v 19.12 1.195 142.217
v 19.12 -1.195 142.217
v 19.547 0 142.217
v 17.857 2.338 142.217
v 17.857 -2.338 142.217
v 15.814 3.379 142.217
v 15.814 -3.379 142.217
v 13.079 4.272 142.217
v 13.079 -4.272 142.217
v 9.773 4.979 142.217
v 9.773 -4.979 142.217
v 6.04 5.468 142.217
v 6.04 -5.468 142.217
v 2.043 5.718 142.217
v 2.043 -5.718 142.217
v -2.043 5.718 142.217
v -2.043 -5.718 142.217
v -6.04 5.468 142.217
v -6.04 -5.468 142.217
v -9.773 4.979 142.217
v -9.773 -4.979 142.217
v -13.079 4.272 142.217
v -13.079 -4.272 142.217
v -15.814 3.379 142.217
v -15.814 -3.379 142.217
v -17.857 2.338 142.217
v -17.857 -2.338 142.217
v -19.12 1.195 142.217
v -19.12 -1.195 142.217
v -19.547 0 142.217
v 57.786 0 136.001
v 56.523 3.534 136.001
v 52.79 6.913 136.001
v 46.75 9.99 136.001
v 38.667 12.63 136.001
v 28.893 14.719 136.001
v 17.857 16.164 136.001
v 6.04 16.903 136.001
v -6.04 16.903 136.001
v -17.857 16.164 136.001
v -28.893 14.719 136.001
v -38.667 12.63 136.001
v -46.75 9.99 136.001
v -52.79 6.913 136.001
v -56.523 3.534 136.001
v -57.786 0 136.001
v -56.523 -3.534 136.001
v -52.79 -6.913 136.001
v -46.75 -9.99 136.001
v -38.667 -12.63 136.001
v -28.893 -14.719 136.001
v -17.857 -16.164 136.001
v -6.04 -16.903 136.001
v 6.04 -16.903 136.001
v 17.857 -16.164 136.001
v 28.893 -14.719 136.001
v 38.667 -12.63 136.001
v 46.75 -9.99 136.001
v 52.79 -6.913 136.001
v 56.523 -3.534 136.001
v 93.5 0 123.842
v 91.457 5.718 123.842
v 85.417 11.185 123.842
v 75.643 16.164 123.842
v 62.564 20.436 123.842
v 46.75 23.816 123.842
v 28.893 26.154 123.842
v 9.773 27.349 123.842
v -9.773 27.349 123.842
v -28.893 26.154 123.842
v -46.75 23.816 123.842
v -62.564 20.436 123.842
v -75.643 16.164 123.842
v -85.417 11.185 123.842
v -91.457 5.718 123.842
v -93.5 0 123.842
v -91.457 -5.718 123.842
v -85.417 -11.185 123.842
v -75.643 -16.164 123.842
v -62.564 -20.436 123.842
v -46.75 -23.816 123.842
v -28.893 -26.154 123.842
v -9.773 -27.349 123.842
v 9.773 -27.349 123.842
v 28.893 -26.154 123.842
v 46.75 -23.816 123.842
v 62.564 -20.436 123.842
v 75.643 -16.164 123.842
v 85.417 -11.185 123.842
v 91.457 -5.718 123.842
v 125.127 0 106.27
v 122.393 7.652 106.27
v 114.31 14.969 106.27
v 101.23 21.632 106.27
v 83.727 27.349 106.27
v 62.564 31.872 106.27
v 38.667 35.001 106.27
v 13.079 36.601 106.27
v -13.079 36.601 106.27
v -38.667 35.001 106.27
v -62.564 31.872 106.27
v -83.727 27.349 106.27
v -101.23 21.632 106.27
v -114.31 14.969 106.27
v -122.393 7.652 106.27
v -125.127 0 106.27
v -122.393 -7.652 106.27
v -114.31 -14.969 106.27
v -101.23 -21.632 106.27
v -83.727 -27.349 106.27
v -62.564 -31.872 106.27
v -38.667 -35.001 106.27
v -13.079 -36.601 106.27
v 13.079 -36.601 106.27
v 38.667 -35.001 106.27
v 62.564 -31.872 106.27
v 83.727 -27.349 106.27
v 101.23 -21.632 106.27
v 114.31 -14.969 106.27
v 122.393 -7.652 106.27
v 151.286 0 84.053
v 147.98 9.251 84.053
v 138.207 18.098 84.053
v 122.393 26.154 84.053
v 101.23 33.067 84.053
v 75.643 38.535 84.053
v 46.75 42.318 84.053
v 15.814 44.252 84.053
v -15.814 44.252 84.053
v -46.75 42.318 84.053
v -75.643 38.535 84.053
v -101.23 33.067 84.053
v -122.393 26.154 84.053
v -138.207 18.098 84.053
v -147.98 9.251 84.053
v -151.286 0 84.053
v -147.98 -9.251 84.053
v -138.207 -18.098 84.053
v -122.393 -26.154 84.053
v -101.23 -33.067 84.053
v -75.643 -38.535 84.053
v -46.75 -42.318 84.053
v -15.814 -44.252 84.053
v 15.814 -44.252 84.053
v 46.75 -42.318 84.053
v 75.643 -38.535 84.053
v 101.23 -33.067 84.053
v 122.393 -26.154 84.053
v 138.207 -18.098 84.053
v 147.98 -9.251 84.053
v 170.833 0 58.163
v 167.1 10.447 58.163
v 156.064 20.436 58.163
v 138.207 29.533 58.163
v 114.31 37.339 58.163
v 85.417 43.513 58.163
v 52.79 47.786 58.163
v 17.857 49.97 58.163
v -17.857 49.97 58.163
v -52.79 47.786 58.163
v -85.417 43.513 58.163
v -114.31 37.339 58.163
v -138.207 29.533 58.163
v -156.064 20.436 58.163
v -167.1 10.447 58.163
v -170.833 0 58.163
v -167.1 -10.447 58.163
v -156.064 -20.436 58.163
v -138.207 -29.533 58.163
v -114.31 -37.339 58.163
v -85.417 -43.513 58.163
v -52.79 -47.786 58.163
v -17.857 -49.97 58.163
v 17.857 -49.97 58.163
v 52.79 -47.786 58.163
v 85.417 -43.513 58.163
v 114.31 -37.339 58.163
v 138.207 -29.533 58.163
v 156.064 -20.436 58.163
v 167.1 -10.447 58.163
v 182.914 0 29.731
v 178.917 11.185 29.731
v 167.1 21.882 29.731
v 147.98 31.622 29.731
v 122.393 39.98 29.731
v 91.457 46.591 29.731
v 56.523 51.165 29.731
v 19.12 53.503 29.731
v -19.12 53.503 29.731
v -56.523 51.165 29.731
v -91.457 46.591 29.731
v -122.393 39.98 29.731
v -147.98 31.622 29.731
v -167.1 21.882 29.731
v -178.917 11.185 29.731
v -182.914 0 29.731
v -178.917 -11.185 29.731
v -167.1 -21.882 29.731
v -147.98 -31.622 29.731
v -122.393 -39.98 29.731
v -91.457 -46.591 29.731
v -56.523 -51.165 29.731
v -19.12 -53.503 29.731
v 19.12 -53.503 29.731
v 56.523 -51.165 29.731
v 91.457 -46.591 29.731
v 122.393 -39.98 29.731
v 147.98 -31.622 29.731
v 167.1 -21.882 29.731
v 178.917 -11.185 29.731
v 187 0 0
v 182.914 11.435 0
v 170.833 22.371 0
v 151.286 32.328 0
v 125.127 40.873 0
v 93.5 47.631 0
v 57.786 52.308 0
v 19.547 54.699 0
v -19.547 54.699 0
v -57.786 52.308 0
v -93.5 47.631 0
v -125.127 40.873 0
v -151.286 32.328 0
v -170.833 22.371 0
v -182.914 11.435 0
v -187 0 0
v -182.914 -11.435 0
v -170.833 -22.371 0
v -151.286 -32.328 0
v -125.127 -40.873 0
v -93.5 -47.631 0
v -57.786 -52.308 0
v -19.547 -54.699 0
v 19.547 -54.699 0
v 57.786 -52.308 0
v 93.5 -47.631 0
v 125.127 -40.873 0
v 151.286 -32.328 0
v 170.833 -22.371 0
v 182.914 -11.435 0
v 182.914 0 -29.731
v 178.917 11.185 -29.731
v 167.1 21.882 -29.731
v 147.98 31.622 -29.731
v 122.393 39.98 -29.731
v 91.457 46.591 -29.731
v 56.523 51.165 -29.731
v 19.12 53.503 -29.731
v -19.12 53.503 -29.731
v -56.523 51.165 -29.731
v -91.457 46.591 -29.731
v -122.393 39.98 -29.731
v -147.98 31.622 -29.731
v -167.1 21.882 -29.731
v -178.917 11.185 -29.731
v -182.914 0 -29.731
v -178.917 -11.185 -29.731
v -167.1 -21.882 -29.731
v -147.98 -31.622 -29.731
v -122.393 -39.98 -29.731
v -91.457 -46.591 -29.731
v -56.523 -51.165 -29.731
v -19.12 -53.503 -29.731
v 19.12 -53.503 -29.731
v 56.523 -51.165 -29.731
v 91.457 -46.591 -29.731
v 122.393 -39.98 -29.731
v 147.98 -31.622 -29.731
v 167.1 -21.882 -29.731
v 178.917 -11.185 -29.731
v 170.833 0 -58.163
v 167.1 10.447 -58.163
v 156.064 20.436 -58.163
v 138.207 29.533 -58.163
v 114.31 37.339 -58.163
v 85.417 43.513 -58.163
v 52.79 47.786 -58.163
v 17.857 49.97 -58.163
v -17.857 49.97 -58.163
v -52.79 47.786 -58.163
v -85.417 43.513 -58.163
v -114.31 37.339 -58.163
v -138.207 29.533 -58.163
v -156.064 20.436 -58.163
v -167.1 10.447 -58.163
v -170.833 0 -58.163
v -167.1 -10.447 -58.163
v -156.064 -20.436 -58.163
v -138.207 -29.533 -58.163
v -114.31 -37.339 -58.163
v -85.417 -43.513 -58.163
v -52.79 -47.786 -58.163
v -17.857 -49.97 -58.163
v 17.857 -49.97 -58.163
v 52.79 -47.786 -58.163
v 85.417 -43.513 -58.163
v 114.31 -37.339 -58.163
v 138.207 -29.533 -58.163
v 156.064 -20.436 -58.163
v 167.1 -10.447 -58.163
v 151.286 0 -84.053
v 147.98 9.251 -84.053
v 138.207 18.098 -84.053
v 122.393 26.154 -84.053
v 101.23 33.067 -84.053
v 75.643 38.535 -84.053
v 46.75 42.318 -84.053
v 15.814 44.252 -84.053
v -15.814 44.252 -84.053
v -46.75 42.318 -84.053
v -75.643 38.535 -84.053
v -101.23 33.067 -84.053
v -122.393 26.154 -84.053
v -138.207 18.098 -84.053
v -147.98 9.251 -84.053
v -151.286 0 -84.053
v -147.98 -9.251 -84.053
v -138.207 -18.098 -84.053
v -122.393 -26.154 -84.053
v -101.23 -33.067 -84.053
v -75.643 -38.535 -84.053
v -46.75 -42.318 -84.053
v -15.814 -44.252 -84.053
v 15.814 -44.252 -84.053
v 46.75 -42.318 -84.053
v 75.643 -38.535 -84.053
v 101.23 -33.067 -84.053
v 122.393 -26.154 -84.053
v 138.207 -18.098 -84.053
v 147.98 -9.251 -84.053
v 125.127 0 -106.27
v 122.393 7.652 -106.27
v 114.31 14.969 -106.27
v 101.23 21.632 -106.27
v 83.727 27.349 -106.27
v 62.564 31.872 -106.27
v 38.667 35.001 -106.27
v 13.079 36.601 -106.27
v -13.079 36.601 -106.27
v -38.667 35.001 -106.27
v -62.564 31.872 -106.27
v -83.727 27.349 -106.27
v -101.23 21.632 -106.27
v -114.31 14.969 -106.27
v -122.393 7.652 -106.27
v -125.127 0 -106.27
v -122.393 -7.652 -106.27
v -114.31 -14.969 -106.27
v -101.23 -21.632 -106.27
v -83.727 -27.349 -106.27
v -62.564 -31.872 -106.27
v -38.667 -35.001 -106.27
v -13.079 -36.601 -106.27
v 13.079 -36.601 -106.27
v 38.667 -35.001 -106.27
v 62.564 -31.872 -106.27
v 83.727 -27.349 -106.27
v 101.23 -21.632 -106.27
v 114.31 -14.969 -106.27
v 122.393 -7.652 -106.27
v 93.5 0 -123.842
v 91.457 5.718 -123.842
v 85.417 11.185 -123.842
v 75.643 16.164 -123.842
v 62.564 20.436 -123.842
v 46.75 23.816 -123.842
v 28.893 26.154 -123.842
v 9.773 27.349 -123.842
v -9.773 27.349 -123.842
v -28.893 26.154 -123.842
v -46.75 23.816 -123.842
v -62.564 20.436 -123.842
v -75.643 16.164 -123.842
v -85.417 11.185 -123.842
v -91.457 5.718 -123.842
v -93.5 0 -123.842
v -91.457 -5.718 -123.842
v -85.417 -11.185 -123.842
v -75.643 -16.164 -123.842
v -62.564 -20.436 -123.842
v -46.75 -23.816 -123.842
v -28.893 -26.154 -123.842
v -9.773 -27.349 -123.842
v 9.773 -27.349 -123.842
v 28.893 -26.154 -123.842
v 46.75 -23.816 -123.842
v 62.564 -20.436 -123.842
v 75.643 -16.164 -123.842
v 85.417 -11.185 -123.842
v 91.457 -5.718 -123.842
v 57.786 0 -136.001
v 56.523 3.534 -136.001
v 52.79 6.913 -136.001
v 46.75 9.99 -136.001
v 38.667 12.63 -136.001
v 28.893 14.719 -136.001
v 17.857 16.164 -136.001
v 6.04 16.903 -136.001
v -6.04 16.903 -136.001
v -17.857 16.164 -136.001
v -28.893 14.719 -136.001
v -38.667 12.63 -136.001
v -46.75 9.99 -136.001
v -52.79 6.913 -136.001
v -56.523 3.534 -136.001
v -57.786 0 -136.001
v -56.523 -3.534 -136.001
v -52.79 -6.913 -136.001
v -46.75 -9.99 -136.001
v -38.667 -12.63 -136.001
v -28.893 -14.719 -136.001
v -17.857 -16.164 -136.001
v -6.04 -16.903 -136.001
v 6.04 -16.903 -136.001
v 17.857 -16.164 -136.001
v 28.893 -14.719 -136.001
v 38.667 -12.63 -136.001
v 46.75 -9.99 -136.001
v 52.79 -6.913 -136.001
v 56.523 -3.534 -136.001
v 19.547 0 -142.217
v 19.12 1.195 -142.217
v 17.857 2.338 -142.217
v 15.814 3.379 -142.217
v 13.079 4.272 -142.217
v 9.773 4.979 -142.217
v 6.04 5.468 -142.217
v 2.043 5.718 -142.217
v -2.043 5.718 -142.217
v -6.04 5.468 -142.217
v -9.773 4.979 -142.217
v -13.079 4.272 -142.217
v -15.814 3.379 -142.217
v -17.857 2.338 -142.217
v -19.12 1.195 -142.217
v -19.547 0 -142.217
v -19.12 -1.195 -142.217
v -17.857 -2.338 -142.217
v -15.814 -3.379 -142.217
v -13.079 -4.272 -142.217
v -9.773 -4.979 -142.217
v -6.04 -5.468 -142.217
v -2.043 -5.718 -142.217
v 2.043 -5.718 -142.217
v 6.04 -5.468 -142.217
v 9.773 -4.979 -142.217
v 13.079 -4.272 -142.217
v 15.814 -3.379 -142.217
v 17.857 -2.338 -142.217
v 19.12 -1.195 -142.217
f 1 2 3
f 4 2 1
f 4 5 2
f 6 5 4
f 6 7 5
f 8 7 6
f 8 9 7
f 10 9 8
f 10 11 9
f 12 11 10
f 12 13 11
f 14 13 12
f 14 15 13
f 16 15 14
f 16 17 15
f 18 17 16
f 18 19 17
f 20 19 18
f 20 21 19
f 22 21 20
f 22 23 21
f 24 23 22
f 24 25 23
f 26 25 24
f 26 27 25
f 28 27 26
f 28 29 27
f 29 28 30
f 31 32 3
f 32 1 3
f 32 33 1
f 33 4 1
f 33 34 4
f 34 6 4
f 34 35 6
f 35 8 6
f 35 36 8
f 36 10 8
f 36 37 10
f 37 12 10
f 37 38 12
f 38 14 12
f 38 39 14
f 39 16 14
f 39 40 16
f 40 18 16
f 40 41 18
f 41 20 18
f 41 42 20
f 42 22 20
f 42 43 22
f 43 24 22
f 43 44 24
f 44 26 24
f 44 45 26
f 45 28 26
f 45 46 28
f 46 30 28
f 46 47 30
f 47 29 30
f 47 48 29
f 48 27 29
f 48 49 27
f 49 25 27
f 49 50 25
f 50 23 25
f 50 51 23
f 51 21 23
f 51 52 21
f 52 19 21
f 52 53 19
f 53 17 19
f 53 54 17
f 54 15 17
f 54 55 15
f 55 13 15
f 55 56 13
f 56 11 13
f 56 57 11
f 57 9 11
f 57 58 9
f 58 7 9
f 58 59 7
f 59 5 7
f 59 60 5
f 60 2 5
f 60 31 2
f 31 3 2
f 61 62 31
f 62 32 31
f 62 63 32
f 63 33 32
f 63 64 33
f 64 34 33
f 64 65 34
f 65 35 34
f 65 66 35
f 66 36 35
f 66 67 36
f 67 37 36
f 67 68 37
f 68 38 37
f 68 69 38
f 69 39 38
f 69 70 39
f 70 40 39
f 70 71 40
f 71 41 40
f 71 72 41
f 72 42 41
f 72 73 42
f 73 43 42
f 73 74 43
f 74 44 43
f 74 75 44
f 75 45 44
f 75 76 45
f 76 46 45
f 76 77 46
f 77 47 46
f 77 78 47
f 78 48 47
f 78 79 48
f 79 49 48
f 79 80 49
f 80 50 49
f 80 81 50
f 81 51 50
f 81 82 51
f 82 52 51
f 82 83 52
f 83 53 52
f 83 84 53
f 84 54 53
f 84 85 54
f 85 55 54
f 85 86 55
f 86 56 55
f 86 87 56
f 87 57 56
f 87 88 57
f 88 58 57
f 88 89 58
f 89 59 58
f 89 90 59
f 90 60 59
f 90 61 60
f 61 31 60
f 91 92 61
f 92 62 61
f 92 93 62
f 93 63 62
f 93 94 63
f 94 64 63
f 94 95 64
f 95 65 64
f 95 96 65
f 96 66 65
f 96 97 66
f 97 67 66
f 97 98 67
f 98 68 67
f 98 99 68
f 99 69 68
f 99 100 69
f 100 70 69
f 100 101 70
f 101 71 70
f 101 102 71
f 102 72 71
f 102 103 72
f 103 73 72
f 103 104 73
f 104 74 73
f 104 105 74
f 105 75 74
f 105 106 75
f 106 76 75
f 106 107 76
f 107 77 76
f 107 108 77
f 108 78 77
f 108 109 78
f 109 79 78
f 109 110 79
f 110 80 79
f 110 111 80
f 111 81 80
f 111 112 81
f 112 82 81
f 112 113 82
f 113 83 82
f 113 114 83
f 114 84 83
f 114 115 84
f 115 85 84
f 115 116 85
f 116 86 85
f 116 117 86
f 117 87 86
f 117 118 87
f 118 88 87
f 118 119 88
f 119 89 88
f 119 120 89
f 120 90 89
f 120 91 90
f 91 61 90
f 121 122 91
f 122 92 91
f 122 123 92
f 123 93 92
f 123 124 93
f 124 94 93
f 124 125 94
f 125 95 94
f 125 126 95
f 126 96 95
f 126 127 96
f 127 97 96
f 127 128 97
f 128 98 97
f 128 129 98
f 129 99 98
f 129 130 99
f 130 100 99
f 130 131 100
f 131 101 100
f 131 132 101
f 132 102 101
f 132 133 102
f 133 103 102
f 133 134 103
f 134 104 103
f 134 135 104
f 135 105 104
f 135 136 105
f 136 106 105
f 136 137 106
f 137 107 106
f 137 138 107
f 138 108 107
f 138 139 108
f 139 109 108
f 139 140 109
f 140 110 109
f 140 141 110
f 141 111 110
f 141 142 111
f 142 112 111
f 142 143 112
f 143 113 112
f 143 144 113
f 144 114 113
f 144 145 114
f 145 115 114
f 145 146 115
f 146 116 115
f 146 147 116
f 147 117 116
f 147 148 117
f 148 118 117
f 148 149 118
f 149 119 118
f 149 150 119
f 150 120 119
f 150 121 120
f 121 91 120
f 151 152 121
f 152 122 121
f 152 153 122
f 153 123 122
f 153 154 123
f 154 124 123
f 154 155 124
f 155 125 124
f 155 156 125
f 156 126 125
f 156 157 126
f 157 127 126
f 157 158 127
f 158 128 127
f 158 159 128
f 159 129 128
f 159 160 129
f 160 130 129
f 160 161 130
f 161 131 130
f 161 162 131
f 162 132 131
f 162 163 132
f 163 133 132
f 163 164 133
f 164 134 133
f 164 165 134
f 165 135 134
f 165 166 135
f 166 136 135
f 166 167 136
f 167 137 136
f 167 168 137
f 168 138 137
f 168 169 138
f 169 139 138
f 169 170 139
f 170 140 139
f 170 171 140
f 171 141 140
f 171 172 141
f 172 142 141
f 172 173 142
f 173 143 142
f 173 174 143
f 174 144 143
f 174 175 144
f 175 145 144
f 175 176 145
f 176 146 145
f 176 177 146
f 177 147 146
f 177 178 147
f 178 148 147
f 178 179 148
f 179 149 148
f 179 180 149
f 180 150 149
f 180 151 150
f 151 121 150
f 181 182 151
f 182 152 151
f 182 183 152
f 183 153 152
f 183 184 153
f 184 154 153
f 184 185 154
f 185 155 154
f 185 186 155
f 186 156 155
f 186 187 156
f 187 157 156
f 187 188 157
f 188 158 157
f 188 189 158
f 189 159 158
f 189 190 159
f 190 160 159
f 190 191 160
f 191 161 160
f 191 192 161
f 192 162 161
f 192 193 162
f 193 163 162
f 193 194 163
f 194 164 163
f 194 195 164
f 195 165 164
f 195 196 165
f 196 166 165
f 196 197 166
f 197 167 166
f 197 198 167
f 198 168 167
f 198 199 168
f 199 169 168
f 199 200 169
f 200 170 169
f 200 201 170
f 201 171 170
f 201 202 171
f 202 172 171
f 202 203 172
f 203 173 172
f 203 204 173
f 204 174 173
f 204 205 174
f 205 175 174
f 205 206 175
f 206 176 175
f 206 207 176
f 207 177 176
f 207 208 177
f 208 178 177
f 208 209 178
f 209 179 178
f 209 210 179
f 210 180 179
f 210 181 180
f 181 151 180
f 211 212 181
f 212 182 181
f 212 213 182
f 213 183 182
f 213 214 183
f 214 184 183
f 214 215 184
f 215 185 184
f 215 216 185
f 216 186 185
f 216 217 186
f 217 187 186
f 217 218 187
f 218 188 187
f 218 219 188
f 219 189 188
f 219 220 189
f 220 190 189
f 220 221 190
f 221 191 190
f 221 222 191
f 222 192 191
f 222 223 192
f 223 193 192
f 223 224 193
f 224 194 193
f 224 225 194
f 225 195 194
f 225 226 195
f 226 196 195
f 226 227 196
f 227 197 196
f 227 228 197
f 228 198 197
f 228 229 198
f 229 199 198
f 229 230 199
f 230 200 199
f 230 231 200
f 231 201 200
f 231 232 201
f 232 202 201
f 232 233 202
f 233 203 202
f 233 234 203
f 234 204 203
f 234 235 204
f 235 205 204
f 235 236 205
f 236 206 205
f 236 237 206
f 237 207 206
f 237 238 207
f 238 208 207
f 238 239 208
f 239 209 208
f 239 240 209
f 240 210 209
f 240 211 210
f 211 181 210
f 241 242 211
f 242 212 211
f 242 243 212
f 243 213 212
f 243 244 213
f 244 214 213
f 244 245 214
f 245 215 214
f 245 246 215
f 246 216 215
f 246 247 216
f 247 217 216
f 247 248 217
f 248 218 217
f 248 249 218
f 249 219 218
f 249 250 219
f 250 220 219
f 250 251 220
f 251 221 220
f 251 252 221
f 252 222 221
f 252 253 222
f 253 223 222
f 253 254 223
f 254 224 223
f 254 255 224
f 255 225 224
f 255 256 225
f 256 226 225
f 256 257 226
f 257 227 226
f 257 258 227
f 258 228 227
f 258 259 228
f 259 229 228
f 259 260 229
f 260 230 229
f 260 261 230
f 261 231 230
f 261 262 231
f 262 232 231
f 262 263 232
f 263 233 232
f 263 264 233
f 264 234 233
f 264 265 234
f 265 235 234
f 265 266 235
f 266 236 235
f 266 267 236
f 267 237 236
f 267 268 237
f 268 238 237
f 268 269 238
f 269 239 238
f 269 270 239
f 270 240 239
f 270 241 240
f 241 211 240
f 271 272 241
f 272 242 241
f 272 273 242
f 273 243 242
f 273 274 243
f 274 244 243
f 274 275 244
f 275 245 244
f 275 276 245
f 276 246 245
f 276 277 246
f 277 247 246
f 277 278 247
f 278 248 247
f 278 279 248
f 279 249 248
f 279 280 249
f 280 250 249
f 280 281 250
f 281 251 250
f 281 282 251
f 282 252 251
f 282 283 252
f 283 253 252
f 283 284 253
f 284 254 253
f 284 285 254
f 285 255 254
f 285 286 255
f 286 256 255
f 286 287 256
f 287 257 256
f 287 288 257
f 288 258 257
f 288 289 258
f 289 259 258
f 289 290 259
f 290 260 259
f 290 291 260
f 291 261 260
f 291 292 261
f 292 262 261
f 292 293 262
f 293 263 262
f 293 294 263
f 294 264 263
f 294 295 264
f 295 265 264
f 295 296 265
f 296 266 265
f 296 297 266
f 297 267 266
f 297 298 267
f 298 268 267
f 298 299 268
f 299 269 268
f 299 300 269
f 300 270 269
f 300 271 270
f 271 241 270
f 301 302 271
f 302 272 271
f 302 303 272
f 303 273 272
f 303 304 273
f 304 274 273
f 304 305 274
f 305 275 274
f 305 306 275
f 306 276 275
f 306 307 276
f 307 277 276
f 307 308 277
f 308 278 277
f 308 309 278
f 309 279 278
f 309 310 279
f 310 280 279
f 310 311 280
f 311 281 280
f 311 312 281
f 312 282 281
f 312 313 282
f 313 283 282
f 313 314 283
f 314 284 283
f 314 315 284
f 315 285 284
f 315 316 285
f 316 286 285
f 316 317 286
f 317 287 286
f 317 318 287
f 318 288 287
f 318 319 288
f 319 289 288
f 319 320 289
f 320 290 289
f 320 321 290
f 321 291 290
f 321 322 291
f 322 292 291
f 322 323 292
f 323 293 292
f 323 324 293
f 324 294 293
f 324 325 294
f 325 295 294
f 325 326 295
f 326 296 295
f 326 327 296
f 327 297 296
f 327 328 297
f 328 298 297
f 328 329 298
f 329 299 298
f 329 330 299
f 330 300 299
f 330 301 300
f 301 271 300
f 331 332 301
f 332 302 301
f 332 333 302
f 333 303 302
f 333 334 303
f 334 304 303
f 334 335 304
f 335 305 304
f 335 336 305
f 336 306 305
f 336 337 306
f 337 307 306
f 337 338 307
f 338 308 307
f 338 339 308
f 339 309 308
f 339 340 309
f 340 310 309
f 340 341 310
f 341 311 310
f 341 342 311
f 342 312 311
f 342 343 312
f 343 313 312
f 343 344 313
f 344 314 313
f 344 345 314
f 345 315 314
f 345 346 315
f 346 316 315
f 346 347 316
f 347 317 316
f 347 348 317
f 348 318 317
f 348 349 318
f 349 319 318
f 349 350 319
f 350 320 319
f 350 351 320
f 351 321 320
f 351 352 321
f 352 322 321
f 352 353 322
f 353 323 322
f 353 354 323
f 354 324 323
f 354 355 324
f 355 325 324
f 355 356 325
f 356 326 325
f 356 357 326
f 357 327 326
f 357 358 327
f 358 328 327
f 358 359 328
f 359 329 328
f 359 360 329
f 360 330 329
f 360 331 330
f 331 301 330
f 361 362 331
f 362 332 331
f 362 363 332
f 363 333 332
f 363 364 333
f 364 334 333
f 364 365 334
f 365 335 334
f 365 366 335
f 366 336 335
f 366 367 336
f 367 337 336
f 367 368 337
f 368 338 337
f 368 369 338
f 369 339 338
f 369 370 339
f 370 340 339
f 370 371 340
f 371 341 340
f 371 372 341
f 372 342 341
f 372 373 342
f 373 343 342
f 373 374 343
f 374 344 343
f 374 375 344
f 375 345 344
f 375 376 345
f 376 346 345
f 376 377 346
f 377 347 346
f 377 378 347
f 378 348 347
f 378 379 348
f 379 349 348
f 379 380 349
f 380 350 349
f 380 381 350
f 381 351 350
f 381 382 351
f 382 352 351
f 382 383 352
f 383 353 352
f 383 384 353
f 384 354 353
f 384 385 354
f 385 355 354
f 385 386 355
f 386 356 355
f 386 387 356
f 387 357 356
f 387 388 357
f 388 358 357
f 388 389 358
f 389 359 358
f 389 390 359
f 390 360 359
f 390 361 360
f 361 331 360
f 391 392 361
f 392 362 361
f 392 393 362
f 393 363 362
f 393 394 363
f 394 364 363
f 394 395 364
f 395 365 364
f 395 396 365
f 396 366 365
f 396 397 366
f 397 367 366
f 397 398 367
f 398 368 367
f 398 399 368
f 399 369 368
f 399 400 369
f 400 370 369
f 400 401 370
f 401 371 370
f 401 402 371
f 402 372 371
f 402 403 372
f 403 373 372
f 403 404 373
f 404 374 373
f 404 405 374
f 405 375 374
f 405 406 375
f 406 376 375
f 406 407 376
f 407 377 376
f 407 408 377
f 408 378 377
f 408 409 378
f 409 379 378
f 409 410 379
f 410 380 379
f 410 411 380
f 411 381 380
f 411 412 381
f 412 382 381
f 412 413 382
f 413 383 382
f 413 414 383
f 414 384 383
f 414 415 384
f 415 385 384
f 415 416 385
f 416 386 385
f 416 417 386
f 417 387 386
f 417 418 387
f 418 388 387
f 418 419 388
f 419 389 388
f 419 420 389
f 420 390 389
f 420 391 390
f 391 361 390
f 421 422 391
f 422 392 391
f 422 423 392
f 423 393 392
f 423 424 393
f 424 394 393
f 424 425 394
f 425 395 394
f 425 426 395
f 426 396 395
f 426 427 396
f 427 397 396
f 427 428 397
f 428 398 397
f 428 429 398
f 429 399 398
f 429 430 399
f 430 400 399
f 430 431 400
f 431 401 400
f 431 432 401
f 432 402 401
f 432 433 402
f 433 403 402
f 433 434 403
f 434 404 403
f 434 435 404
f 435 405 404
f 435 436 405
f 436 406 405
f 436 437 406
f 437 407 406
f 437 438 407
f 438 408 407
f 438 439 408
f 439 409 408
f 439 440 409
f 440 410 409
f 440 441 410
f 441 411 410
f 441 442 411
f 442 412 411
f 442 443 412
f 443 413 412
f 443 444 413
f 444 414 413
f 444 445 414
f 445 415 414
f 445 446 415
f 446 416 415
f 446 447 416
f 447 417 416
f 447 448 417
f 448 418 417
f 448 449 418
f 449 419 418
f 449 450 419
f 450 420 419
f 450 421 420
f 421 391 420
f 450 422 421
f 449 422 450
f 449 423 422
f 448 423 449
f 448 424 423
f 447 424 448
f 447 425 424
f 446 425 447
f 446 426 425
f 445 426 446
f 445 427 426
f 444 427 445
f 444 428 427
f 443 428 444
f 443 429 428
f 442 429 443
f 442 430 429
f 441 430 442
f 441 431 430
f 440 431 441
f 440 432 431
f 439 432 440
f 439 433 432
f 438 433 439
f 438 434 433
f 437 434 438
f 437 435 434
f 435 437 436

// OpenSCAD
// Generated by SolidPython 1.0.1 on 2020-07-29 00:46:52


scale(v = [17, 5, 13]) {
	sphere(r = 11);
}
/***********************************************
*********      SolidPython code:      **********
************************************************
 
# import packages: SolidPython
from solid import *
from solid.utils import *
from itertools import chain, combinations, permutations


class Resize:

    def __init__(self, scad_file):
        self.scad_file = scad_file
        #self.scad_file = import_scad(scad_file)
        # cone/cylinder param:
        self.r1 = 0
        self.r2 = 0
        self.h = 0
        # rectangular prism param:
        self.w = 0
        self.l = 0
        # ellipse param:
        self.r = 0

    # import OpenScad code (file name corresponds to shape)


    # classify shape + parameters
    def assign(self, param1, param2, param3):
        if self.scad_file == 'cone.scad':
            self.r1 = param1
            self.r2 = param2
            self.h = param3
        elif self.scad_file == 'cylinder.scad':
            self.r1 = param1
            self.r2 = param2
            self.h = param3
        elif self.scad_file == 'rectangularPrism.scad':
            self.h = param1
            self.l = param2
            self.w = param3
        else:
            self.r = param1
            self.h = param2

    # resize parameters
    def iterate(self):
        x = range(3, 20, 2)
        i = 1
        if self.scad_file == 'cone.scad':
            tempList = list(permutations(x, 2))
            for temp in tempList:
                param1 = temp[0]
                param2 = temp[1]
                filepath = 'produced_scad_files/' + 'cone' + str(param1) + '_' + str(param2) + '_' + '.scad'
                scad_render_to_file(cylinder(h=param1, r1=param2, r2=0), filepath)

        elif self.scad_file == 'cylinder.scad':
            tempList = list(permutations(x, 3))
            for temp in tempList:
                param1 = temp[0]
                param2 = temp[1]
                filepath = 'produced_scad_files/' + 'cylinder' + str(param1) + '_' + str(param2) + '_' + '.scad'
                scad_render_to_file(cylinder(h=param1, r1=param2, r2=param2), filepath)

        elif self.scad_file == 'rectangularPrism.scad':
            tempList = list(permutations(x, 3))
            for temp in tempList:
                param1 = temp[0]
                param2 = temp[1]
                param3 = temp[2]
                filepath = 'produced_scad_files/' + 'rectangularPrism' + str(param1) + '_' + str(param2) + '_' + str(
                    param3) + '.scad'
                scad_render_to_file(cube(size=(param1, param2, param3)), filepath)

        elif self.scad_file == 'ellipse.scad':
            tempList = list(permutations(x, 4))
            for temp in tempList:
                param1 = temp[0]
                param2 = temp[1]
                param3 = temp[2]
                param4 = temp[3]
                filepath = 'produced_scad_files/' + 'ellipse' + str(param1) + '_' + str(param2) + '_' + str(param3) + '_' + str(param4) + '.scad'
                scad_render_to_file(scale([param1, param2, param3])(sphere(r=param4)), filepath)

    def render_to_scadfile(self):
        scad_render_to_file(scad, 'example.scad') 
 
************************************************/
